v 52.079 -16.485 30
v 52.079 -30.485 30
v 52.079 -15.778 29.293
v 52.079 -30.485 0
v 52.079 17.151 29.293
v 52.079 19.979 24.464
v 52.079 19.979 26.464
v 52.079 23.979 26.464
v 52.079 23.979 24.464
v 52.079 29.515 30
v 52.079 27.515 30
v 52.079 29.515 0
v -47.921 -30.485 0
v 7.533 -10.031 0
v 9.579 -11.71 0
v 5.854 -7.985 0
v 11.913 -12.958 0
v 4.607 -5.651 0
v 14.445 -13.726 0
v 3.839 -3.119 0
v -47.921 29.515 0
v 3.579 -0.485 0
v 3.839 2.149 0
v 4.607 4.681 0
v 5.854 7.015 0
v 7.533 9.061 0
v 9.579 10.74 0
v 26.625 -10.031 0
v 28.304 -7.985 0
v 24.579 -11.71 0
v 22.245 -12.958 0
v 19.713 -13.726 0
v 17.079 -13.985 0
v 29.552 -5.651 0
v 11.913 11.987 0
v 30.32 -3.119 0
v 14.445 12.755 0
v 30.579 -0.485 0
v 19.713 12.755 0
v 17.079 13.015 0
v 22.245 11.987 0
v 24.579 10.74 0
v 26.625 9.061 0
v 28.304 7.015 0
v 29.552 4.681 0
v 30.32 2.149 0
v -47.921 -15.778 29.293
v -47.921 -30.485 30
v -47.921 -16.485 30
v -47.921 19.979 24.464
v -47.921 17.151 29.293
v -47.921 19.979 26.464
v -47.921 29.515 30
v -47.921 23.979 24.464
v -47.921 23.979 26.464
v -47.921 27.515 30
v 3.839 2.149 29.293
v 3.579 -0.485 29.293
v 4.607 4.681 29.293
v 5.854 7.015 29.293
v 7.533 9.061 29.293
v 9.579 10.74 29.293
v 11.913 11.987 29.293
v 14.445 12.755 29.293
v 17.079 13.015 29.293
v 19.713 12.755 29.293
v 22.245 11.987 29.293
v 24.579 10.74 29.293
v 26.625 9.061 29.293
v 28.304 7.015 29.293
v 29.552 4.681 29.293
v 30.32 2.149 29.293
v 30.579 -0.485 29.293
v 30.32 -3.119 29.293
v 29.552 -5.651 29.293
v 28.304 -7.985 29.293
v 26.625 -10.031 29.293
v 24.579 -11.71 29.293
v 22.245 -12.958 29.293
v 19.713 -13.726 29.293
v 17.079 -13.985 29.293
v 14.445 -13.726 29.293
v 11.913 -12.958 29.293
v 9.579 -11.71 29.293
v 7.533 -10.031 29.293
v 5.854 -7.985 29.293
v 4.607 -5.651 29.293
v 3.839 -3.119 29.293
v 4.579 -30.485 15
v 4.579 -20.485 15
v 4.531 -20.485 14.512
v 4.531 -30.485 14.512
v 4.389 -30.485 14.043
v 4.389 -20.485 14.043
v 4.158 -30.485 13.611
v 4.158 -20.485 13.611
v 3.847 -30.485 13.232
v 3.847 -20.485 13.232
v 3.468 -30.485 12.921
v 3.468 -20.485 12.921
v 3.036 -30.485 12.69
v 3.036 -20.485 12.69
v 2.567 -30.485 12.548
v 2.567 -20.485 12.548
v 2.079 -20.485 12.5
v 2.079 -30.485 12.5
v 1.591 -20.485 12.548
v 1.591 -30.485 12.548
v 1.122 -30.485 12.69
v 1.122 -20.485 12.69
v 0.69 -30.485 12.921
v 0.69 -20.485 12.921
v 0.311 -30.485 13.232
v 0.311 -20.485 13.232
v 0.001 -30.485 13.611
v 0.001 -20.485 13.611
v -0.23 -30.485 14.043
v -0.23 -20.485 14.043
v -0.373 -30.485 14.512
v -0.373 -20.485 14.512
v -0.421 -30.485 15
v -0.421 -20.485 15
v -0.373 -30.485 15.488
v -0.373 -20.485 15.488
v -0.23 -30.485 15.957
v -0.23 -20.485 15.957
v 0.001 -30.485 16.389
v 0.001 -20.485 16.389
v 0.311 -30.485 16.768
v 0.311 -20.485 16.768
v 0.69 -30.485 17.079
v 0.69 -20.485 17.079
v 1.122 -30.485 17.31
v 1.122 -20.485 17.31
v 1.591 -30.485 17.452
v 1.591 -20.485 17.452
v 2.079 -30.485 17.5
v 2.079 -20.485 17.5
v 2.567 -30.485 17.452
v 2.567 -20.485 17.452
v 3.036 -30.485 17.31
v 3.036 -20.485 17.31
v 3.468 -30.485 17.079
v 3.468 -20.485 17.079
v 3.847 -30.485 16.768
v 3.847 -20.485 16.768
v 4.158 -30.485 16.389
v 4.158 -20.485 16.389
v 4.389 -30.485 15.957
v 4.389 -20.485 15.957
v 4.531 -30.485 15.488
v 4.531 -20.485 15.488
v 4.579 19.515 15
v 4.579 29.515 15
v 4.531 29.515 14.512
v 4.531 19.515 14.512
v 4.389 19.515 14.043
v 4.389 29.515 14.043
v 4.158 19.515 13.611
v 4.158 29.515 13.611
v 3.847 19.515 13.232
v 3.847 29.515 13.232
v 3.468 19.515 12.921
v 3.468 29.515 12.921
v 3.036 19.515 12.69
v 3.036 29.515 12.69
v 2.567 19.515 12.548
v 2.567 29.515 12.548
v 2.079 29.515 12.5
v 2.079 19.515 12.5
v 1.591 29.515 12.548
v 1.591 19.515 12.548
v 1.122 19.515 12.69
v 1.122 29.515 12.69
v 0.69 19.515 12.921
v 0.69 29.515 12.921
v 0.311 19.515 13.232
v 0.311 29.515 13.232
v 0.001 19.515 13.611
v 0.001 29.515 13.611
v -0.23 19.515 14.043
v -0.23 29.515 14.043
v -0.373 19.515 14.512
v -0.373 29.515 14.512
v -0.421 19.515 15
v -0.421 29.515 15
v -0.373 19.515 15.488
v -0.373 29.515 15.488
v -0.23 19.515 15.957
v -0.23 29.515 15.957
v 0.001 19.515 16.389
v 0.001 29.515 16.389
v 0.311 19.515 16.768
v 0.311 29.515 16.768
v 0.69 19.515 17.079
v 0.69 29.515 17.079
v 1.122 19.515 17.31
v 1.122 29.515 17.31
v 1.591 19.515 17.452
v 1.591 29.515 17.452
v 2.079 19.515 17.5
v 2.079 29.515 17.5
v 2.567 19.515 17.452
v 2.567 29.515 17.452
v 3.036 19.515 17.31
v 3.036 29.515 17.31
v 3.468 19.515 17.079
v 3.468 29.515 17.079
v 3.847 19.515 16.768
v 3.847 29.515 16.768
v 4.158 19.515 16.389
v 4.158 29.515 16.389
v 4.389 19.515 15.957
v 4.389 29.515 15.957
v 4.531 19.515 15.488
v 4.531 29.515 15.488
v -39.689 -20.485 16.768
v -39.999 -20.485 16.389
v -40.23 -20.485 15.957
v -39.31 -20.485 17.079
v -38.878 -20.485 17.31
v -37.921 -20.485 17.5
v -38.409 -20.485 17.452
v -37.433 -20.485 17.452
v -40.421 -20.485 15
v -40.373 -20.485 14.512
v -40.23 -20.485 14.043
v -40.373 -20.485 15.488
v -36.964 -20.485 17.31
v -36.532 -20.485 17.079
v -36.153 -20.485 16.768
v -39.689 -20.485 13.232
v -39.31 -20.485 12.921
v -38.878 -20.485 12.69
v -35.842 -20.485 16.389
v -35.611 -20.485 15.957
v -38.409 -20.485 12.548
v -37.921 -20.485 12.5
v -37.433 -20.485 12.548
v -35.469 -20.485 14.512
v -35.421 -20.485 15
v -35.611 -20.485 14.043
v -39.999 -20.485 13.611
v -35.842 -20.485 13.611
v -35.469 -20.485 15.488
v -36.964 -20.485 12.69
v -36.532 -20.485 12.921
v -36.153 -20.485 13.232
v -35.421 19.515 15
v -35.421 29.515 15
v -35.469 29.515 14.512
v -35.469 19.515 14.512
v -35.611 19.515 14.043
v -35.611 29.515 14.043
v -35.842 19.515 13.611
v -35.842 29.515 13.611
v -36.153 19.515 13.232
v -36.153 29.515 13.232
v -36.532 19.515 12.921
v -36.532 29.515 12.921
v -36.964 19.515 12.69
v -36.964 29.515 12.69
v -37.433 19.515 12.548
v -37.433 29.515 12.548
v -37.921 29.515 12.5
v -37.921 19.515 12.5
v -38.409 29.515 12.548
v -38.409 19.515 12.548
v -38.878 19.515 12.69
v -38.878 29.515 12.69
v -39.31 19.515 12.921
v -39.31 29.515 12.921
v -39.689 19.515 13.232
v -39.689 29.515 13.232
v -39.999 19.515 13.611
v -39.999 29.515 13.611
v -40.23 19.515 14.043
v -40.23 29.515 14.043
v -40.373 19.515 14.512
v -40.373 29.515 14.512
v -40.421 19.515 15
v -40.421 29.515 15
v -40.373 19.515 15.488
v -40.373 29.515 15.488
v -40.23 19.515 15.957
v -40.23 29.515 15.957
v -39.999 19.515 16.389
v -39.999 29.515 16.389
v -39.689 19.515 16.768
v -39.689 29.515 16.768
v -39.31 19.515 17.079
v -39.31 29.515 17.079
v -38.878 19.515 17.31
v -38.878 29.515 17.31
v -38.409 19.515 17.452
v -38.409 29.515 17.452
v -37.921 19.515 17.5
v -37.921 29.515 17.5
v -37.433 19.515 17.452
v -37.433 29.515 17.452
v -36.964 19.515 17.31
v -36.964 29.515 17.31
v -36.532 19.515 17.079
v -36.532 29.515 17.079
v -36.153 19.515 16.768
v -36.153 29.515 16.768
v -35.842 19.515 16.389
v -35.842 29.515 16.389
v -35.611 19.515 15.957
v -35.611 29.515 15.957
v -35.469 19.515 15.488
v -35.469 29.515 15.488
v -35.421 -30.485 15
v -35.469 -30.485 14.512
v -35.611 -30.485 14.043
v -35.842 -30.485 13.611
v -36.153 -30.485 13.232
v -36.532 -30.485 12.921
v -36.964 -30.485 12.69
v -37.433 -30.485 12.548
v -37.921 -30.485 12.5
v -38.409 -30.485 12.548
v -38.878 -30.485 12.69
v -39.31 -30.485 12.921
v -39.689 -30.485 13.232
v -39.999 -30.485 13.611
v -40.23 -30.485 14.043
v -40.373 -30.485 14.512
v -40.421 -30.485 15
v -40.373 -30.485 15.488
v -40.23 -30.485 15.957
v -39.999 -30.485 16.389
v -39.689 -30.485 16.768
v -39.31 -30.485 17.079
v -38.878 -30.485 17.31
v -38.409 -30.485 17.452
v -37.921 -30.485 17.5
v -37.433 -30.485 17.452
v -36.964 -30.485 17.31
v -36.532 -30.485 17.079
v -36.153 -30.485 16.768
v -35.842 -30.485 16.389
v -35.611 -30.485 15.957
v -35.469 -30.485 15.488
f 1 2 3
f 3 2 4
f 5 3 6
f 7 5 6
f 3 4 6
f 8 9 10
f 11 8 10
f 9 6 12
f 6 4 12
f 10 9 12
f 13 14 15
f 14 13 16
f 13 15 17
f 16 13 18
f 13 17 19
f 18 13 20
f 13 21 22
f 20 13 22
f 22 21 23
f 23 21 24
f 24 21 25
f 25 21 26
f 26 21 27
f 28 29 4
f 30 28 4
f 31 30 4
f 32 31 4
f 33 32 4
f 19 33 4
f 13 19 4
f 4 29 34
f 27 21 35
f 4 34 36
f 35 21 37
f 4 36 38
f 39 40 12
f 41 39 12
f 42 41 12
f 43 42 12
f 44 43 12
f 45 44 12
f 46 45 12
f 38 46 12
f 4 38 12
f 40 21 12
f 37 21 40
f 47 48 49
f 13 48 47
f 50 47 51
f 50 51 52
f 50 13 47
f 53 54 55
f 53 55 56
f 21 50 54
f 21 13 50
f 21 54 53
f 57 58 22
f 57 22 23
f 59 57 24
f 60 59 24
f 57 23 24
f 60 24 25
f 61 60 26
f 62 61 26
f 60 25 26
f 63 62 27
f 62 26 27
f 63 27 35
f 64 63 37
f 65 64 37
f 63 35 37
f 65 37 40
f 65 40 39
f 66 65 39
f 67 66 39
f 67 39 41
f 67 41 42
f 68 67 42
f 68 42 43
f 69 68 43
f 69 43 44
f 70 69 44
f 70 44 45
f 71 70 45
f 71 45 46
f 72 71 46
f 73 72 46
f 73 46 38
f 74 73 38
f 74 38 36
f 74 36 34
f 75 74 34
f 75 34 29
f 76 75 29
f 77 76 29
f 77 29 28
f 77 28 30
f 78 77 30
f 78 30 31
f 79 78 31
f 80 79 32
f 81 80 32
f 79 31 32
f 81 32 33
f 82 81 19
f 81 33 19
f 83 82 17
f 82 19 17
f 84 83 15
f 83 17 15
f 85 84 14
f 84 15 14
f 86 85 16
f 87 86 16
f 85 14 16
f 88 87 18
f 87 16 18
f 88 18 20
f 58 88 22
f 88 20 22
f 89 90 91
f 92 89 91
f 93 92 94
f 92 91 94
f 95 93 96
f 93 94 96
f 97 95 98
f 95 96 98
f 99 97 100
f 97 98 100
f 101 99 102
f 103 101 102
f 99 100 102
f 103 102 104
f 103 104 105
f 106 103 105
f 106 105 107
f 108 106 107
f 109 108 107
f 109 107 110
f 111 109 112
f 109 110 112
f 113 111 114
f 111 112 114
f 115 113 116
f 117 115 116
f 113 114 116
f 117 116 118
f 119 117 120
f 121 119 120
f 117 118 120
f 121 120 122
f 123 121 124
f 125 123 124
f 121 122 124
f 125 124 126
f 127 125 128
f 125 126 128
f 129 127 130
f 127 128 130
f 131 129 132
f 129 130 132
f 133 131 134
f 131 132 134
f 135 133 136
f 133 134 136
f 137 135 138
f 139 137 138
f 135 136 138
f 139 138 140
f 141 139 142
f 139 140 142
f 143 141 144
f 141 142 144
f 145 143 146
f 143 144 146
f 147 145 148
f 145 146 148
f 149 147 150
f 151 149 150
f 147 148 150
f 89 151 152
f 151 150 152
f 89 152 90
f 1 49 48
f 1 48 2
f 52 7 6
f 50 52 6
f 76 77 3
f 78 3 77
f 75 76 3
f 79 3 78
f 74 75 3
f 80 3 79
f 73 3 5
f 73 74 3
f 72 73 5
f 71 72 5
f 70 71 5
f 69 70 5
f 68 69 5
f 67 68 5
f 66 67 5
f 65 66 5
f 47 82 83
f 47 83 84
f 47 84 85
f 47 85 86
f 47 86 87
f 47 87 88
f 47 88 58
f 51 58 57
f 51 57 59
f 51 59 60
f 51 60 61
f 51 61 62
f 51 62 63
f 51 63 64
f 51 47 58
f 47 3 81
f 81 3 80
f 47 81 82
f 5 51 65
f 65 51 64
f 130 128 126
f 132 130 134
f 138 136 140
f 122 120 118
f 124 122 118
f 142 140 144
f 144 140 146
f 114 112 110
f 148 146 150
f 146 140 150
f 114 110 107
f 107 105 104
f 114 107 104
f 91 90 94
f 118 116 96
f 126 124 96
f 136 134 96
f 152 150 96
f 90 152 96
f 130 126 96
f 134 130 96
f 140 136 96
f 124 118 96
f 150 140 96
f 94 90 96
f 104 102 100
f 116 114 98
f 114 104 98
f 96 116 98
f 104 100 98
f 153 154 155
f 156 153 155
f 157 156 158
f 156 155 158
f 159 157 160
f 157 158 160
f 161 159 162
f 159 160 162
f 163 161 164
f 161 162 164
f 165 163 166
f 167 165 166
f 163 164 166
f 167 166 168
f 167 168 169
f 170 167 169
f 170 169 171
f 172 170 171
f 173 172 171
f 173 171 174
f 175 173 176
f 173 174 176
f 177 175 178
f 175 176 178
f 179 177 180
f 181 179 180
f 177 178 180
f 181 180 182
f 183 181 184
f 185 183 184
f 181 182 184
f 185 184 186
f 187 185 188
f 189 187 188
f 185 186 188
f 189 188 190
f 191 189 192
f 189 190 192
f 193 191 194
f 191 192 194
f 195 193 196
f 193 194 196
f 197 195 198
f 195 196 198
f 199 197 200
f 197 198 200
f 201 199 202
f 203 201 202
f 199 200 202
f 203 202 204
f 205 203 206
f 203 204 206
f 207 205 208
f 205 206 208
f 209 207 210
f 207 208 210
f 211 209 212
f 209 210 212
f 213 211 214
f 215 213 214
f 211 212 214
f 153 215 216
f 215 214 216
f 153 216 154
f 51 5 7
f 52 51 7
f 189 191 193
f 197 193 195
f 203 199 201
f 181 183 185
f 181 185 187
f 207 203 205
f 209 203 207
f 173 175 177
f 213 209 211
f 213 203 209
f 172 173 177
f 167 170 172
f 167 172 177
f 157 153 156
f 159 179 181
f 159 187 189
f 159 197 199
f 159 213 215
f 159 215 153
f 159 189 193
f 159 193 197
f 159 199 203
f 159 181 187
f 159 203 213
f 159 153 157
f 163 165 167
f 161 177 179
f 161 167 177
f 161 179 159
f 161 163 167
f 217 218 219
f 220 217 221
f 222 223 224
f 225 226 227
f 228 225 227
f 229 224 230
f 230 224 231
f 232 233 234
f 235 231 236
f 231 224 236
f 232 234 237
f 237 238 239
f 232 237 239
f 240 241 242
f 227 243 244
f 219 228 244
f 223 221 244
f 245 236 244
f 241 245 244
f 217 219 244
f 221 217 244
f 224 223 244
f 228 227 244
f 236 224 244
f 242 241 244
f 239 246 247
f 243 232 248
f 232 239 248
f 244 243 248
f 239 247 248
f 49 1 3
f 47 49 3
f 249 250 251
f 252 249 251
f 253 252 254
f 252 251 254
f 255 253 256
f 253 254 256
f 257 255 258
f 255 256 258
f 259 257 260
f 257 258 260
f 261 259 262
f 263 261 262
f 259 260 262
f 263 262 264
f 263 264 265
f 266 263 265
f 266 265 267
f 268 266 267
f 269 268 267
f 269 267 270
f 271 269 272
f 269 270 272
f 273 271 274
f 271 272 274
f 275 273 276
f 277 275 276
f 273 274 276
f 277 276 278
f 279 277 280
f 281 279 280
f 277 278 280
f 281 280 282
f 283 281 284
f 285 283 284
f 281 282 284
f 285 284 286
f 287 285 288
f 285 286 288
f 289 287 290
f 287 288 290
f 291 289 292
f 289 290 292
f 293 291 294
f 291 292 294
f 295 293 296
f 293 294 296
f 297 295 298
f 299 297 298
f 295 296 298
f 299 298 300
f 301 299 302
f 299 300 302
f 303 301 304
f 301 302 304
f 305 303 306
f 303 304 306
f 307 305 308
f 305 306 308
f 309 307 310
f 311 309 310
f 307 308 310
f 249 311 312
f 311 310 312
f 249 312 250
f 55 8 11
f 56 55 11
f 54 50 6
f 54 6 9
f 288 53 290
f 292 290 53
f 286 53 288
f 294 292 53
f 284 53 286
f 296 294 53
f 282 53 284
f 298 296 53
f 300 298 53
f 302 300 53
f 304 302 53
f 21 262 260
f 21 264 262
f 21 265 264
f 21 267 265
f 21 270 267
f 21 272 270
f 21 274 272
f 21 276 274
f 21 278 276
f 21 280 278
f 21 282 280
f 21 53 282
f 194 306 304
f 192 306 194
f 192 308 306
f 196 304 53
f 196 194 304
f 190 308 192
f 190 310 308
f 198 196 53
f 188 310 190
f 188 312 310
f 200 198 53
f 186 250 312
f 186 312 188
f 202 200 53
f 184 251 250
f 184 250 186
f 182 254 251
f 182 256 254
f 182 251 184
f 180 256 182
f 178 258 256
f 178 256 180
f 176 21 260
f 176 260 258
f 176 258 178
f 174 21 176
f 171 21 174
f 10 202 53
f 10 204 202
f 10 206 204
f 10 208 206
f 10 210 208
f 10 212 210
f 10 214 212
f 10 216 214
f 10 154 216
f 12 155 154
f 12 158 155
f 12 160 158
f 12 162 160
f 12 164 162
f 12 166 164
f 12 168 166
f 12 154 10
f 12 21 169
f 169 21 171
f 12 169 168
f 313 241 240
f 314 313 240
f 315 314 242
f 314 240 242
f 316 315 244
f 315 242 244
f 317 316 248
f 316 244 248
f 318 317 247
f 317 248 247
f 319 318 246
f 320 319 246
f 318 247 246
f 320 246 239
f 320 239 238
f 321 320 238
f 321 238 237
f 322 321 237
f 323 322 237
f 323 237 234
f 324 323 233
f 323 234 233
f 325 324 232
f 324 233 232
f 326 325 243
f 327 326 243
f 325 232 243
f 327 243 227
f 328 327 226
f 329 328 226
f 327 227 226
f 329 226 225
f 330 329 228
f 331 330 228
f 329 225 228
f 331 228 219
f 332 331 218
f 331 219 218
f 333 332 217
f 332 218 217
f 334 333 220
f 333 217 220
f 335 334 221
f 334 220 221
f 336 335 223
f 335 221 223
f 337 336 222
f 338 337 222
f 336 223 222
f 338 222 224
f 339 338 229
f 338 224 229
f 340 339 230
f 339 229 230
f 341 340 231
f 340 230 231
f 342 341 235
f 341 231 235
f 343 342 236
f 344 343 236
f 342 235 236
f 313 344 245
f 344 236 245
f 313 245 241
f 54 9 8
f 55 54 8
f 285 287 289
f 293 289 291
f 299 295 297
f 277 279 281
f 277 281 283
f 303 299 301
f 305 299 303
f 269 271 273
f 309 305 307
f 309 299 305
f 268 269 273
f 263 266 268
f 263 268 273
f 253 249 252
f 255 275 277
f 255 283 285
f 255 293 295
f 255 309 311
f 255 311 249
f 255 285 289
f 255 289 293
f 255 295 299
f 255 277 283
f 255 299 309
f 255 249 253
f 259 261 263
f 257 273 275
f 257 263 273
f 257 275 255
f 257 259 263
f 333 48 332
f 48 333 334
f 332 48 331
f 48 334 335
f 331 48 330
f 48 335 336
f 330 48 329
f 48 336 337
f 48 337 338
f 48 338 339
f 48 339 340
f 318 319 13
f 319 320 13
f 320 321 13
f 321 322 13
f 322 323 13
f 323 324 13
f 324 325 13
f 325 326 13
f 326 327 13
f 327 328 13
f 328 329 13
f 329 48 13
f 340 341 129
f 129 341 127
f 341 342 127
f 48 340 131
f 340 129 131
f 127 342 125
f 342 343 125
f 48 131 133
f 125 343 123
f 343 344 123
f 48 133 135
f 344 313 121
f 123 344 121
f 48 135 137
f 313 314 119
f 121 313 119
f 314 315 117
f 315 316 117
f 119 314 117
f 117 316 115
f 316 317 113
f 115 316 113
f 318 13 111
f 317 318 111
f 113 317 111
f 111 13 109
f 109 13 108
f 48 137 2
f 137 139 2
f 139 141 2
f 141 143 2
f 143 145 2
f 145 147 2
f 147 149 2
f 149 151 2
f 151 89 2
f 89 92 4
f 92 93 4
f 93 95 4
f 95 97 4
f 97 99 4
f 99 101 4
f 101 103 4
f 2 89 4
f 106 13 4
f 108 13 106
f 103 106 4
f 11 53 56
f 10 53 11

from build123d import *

# Parameters (mm, degrees)
SKETCH1_W                   = 100
SKETCH1_H                   = 60
BOSS_EXTRUDE1_DEPTH         = 30
CUT_EXTRUDE1_DEPTH          = 110
SKETCH_1_R                  = 2.5
CUT_EXTRUDE_1_DEPTH         = 10
PATTERN_LINEAR_1_COUNT      = 2
PATTERN_LINEAR_1_PITCH      = 40
PATTERN_LINEAR_1_COUNT_DIR2 = 2
PATTERN_LINEAR_1_PITCH_DIR2 = 50
SKETCH_2_R                  = 13.5
CUT_EXTRUDE_2_DEPTH         = 100


with BuildPart() as part:
    # Sketch1 → Boss-Extrude1 (new body)
    with BuildSketch(Plane.XY):
        with Locations((2.079207921, -0.485148515)):
            Rectangle(SKETCH1_W, SKETCH1_H)
    extrude(amount=BOSS_EXTRUDE1_DEPTH)

    # Sketch3 → Cut-Extrude1 (cut)
    with BuildSketch(Plane.ZY.offset(47.920792079)):
        Polygon((30, -30.485148515), (30, -16.485148515), (29.292893219, -15.778041734), (29.292893219, 17.150890454), (26.464466094, 19.979317579), (24.464466094, 19.979317579), (24.464466094, 23.979317579), (26.464466094, 23.979317579), (30, 27.514851485), (30, 29.514851485), (35.630972976, 28.601630178), (37.149112702, -26.247837132), align=None)
    extrude(amount=-CUT_EXTRUDE1_DEPTH, mode=Mode.SUBTRACT)

    # Эскиз1 → Вырез-Вытянуть1 (cut)
    with BuildSketch(Plane(origin=(0, 29.514851485, 0), x_dir=(1, 0, 0), z_dir=(0, 1, 0))):
        with Locations((2.079207921, -15)):
            Circle(SKETCH_1_R)
    cut_extrude_1 = extrude(amount=-CUT_EXTRUDE_1_DEPTH, mode=Mode.SUBTRACT)

    # Линейный массив1: Cut-Extrude 1 2 × 2
    with Locations(*[(-i * PATTERN_LINEAR_1_PITCH, -j * PATTERN_LINEAR_1_PITCH_DIR2, 0) for i in range(PATTERN_LINEAR_1_COUNT) for j in range(PATTERN_LINEAR_1_COUNT_DIR2) if (i, j) != (0, 0)]):
        add(cut_extrude_1, mode=Mode.SUBTRACT)

    # Эскиз2 → Вырез-Вытянуть2 (cut)
    with BuildSketch(Plane(origin=(0, 0, 0), x_dir=(-1, 0, 0), z_dir=(0, 0, -1))):
        with Locations((-17.079207921, -0.485148515)):
            Circle(SKETCH_2_R)
    extrude(amount=-CUT_EXTRUDE_2_DEPTH, mode=Mode.SUBTRACT)


solid = part.part
